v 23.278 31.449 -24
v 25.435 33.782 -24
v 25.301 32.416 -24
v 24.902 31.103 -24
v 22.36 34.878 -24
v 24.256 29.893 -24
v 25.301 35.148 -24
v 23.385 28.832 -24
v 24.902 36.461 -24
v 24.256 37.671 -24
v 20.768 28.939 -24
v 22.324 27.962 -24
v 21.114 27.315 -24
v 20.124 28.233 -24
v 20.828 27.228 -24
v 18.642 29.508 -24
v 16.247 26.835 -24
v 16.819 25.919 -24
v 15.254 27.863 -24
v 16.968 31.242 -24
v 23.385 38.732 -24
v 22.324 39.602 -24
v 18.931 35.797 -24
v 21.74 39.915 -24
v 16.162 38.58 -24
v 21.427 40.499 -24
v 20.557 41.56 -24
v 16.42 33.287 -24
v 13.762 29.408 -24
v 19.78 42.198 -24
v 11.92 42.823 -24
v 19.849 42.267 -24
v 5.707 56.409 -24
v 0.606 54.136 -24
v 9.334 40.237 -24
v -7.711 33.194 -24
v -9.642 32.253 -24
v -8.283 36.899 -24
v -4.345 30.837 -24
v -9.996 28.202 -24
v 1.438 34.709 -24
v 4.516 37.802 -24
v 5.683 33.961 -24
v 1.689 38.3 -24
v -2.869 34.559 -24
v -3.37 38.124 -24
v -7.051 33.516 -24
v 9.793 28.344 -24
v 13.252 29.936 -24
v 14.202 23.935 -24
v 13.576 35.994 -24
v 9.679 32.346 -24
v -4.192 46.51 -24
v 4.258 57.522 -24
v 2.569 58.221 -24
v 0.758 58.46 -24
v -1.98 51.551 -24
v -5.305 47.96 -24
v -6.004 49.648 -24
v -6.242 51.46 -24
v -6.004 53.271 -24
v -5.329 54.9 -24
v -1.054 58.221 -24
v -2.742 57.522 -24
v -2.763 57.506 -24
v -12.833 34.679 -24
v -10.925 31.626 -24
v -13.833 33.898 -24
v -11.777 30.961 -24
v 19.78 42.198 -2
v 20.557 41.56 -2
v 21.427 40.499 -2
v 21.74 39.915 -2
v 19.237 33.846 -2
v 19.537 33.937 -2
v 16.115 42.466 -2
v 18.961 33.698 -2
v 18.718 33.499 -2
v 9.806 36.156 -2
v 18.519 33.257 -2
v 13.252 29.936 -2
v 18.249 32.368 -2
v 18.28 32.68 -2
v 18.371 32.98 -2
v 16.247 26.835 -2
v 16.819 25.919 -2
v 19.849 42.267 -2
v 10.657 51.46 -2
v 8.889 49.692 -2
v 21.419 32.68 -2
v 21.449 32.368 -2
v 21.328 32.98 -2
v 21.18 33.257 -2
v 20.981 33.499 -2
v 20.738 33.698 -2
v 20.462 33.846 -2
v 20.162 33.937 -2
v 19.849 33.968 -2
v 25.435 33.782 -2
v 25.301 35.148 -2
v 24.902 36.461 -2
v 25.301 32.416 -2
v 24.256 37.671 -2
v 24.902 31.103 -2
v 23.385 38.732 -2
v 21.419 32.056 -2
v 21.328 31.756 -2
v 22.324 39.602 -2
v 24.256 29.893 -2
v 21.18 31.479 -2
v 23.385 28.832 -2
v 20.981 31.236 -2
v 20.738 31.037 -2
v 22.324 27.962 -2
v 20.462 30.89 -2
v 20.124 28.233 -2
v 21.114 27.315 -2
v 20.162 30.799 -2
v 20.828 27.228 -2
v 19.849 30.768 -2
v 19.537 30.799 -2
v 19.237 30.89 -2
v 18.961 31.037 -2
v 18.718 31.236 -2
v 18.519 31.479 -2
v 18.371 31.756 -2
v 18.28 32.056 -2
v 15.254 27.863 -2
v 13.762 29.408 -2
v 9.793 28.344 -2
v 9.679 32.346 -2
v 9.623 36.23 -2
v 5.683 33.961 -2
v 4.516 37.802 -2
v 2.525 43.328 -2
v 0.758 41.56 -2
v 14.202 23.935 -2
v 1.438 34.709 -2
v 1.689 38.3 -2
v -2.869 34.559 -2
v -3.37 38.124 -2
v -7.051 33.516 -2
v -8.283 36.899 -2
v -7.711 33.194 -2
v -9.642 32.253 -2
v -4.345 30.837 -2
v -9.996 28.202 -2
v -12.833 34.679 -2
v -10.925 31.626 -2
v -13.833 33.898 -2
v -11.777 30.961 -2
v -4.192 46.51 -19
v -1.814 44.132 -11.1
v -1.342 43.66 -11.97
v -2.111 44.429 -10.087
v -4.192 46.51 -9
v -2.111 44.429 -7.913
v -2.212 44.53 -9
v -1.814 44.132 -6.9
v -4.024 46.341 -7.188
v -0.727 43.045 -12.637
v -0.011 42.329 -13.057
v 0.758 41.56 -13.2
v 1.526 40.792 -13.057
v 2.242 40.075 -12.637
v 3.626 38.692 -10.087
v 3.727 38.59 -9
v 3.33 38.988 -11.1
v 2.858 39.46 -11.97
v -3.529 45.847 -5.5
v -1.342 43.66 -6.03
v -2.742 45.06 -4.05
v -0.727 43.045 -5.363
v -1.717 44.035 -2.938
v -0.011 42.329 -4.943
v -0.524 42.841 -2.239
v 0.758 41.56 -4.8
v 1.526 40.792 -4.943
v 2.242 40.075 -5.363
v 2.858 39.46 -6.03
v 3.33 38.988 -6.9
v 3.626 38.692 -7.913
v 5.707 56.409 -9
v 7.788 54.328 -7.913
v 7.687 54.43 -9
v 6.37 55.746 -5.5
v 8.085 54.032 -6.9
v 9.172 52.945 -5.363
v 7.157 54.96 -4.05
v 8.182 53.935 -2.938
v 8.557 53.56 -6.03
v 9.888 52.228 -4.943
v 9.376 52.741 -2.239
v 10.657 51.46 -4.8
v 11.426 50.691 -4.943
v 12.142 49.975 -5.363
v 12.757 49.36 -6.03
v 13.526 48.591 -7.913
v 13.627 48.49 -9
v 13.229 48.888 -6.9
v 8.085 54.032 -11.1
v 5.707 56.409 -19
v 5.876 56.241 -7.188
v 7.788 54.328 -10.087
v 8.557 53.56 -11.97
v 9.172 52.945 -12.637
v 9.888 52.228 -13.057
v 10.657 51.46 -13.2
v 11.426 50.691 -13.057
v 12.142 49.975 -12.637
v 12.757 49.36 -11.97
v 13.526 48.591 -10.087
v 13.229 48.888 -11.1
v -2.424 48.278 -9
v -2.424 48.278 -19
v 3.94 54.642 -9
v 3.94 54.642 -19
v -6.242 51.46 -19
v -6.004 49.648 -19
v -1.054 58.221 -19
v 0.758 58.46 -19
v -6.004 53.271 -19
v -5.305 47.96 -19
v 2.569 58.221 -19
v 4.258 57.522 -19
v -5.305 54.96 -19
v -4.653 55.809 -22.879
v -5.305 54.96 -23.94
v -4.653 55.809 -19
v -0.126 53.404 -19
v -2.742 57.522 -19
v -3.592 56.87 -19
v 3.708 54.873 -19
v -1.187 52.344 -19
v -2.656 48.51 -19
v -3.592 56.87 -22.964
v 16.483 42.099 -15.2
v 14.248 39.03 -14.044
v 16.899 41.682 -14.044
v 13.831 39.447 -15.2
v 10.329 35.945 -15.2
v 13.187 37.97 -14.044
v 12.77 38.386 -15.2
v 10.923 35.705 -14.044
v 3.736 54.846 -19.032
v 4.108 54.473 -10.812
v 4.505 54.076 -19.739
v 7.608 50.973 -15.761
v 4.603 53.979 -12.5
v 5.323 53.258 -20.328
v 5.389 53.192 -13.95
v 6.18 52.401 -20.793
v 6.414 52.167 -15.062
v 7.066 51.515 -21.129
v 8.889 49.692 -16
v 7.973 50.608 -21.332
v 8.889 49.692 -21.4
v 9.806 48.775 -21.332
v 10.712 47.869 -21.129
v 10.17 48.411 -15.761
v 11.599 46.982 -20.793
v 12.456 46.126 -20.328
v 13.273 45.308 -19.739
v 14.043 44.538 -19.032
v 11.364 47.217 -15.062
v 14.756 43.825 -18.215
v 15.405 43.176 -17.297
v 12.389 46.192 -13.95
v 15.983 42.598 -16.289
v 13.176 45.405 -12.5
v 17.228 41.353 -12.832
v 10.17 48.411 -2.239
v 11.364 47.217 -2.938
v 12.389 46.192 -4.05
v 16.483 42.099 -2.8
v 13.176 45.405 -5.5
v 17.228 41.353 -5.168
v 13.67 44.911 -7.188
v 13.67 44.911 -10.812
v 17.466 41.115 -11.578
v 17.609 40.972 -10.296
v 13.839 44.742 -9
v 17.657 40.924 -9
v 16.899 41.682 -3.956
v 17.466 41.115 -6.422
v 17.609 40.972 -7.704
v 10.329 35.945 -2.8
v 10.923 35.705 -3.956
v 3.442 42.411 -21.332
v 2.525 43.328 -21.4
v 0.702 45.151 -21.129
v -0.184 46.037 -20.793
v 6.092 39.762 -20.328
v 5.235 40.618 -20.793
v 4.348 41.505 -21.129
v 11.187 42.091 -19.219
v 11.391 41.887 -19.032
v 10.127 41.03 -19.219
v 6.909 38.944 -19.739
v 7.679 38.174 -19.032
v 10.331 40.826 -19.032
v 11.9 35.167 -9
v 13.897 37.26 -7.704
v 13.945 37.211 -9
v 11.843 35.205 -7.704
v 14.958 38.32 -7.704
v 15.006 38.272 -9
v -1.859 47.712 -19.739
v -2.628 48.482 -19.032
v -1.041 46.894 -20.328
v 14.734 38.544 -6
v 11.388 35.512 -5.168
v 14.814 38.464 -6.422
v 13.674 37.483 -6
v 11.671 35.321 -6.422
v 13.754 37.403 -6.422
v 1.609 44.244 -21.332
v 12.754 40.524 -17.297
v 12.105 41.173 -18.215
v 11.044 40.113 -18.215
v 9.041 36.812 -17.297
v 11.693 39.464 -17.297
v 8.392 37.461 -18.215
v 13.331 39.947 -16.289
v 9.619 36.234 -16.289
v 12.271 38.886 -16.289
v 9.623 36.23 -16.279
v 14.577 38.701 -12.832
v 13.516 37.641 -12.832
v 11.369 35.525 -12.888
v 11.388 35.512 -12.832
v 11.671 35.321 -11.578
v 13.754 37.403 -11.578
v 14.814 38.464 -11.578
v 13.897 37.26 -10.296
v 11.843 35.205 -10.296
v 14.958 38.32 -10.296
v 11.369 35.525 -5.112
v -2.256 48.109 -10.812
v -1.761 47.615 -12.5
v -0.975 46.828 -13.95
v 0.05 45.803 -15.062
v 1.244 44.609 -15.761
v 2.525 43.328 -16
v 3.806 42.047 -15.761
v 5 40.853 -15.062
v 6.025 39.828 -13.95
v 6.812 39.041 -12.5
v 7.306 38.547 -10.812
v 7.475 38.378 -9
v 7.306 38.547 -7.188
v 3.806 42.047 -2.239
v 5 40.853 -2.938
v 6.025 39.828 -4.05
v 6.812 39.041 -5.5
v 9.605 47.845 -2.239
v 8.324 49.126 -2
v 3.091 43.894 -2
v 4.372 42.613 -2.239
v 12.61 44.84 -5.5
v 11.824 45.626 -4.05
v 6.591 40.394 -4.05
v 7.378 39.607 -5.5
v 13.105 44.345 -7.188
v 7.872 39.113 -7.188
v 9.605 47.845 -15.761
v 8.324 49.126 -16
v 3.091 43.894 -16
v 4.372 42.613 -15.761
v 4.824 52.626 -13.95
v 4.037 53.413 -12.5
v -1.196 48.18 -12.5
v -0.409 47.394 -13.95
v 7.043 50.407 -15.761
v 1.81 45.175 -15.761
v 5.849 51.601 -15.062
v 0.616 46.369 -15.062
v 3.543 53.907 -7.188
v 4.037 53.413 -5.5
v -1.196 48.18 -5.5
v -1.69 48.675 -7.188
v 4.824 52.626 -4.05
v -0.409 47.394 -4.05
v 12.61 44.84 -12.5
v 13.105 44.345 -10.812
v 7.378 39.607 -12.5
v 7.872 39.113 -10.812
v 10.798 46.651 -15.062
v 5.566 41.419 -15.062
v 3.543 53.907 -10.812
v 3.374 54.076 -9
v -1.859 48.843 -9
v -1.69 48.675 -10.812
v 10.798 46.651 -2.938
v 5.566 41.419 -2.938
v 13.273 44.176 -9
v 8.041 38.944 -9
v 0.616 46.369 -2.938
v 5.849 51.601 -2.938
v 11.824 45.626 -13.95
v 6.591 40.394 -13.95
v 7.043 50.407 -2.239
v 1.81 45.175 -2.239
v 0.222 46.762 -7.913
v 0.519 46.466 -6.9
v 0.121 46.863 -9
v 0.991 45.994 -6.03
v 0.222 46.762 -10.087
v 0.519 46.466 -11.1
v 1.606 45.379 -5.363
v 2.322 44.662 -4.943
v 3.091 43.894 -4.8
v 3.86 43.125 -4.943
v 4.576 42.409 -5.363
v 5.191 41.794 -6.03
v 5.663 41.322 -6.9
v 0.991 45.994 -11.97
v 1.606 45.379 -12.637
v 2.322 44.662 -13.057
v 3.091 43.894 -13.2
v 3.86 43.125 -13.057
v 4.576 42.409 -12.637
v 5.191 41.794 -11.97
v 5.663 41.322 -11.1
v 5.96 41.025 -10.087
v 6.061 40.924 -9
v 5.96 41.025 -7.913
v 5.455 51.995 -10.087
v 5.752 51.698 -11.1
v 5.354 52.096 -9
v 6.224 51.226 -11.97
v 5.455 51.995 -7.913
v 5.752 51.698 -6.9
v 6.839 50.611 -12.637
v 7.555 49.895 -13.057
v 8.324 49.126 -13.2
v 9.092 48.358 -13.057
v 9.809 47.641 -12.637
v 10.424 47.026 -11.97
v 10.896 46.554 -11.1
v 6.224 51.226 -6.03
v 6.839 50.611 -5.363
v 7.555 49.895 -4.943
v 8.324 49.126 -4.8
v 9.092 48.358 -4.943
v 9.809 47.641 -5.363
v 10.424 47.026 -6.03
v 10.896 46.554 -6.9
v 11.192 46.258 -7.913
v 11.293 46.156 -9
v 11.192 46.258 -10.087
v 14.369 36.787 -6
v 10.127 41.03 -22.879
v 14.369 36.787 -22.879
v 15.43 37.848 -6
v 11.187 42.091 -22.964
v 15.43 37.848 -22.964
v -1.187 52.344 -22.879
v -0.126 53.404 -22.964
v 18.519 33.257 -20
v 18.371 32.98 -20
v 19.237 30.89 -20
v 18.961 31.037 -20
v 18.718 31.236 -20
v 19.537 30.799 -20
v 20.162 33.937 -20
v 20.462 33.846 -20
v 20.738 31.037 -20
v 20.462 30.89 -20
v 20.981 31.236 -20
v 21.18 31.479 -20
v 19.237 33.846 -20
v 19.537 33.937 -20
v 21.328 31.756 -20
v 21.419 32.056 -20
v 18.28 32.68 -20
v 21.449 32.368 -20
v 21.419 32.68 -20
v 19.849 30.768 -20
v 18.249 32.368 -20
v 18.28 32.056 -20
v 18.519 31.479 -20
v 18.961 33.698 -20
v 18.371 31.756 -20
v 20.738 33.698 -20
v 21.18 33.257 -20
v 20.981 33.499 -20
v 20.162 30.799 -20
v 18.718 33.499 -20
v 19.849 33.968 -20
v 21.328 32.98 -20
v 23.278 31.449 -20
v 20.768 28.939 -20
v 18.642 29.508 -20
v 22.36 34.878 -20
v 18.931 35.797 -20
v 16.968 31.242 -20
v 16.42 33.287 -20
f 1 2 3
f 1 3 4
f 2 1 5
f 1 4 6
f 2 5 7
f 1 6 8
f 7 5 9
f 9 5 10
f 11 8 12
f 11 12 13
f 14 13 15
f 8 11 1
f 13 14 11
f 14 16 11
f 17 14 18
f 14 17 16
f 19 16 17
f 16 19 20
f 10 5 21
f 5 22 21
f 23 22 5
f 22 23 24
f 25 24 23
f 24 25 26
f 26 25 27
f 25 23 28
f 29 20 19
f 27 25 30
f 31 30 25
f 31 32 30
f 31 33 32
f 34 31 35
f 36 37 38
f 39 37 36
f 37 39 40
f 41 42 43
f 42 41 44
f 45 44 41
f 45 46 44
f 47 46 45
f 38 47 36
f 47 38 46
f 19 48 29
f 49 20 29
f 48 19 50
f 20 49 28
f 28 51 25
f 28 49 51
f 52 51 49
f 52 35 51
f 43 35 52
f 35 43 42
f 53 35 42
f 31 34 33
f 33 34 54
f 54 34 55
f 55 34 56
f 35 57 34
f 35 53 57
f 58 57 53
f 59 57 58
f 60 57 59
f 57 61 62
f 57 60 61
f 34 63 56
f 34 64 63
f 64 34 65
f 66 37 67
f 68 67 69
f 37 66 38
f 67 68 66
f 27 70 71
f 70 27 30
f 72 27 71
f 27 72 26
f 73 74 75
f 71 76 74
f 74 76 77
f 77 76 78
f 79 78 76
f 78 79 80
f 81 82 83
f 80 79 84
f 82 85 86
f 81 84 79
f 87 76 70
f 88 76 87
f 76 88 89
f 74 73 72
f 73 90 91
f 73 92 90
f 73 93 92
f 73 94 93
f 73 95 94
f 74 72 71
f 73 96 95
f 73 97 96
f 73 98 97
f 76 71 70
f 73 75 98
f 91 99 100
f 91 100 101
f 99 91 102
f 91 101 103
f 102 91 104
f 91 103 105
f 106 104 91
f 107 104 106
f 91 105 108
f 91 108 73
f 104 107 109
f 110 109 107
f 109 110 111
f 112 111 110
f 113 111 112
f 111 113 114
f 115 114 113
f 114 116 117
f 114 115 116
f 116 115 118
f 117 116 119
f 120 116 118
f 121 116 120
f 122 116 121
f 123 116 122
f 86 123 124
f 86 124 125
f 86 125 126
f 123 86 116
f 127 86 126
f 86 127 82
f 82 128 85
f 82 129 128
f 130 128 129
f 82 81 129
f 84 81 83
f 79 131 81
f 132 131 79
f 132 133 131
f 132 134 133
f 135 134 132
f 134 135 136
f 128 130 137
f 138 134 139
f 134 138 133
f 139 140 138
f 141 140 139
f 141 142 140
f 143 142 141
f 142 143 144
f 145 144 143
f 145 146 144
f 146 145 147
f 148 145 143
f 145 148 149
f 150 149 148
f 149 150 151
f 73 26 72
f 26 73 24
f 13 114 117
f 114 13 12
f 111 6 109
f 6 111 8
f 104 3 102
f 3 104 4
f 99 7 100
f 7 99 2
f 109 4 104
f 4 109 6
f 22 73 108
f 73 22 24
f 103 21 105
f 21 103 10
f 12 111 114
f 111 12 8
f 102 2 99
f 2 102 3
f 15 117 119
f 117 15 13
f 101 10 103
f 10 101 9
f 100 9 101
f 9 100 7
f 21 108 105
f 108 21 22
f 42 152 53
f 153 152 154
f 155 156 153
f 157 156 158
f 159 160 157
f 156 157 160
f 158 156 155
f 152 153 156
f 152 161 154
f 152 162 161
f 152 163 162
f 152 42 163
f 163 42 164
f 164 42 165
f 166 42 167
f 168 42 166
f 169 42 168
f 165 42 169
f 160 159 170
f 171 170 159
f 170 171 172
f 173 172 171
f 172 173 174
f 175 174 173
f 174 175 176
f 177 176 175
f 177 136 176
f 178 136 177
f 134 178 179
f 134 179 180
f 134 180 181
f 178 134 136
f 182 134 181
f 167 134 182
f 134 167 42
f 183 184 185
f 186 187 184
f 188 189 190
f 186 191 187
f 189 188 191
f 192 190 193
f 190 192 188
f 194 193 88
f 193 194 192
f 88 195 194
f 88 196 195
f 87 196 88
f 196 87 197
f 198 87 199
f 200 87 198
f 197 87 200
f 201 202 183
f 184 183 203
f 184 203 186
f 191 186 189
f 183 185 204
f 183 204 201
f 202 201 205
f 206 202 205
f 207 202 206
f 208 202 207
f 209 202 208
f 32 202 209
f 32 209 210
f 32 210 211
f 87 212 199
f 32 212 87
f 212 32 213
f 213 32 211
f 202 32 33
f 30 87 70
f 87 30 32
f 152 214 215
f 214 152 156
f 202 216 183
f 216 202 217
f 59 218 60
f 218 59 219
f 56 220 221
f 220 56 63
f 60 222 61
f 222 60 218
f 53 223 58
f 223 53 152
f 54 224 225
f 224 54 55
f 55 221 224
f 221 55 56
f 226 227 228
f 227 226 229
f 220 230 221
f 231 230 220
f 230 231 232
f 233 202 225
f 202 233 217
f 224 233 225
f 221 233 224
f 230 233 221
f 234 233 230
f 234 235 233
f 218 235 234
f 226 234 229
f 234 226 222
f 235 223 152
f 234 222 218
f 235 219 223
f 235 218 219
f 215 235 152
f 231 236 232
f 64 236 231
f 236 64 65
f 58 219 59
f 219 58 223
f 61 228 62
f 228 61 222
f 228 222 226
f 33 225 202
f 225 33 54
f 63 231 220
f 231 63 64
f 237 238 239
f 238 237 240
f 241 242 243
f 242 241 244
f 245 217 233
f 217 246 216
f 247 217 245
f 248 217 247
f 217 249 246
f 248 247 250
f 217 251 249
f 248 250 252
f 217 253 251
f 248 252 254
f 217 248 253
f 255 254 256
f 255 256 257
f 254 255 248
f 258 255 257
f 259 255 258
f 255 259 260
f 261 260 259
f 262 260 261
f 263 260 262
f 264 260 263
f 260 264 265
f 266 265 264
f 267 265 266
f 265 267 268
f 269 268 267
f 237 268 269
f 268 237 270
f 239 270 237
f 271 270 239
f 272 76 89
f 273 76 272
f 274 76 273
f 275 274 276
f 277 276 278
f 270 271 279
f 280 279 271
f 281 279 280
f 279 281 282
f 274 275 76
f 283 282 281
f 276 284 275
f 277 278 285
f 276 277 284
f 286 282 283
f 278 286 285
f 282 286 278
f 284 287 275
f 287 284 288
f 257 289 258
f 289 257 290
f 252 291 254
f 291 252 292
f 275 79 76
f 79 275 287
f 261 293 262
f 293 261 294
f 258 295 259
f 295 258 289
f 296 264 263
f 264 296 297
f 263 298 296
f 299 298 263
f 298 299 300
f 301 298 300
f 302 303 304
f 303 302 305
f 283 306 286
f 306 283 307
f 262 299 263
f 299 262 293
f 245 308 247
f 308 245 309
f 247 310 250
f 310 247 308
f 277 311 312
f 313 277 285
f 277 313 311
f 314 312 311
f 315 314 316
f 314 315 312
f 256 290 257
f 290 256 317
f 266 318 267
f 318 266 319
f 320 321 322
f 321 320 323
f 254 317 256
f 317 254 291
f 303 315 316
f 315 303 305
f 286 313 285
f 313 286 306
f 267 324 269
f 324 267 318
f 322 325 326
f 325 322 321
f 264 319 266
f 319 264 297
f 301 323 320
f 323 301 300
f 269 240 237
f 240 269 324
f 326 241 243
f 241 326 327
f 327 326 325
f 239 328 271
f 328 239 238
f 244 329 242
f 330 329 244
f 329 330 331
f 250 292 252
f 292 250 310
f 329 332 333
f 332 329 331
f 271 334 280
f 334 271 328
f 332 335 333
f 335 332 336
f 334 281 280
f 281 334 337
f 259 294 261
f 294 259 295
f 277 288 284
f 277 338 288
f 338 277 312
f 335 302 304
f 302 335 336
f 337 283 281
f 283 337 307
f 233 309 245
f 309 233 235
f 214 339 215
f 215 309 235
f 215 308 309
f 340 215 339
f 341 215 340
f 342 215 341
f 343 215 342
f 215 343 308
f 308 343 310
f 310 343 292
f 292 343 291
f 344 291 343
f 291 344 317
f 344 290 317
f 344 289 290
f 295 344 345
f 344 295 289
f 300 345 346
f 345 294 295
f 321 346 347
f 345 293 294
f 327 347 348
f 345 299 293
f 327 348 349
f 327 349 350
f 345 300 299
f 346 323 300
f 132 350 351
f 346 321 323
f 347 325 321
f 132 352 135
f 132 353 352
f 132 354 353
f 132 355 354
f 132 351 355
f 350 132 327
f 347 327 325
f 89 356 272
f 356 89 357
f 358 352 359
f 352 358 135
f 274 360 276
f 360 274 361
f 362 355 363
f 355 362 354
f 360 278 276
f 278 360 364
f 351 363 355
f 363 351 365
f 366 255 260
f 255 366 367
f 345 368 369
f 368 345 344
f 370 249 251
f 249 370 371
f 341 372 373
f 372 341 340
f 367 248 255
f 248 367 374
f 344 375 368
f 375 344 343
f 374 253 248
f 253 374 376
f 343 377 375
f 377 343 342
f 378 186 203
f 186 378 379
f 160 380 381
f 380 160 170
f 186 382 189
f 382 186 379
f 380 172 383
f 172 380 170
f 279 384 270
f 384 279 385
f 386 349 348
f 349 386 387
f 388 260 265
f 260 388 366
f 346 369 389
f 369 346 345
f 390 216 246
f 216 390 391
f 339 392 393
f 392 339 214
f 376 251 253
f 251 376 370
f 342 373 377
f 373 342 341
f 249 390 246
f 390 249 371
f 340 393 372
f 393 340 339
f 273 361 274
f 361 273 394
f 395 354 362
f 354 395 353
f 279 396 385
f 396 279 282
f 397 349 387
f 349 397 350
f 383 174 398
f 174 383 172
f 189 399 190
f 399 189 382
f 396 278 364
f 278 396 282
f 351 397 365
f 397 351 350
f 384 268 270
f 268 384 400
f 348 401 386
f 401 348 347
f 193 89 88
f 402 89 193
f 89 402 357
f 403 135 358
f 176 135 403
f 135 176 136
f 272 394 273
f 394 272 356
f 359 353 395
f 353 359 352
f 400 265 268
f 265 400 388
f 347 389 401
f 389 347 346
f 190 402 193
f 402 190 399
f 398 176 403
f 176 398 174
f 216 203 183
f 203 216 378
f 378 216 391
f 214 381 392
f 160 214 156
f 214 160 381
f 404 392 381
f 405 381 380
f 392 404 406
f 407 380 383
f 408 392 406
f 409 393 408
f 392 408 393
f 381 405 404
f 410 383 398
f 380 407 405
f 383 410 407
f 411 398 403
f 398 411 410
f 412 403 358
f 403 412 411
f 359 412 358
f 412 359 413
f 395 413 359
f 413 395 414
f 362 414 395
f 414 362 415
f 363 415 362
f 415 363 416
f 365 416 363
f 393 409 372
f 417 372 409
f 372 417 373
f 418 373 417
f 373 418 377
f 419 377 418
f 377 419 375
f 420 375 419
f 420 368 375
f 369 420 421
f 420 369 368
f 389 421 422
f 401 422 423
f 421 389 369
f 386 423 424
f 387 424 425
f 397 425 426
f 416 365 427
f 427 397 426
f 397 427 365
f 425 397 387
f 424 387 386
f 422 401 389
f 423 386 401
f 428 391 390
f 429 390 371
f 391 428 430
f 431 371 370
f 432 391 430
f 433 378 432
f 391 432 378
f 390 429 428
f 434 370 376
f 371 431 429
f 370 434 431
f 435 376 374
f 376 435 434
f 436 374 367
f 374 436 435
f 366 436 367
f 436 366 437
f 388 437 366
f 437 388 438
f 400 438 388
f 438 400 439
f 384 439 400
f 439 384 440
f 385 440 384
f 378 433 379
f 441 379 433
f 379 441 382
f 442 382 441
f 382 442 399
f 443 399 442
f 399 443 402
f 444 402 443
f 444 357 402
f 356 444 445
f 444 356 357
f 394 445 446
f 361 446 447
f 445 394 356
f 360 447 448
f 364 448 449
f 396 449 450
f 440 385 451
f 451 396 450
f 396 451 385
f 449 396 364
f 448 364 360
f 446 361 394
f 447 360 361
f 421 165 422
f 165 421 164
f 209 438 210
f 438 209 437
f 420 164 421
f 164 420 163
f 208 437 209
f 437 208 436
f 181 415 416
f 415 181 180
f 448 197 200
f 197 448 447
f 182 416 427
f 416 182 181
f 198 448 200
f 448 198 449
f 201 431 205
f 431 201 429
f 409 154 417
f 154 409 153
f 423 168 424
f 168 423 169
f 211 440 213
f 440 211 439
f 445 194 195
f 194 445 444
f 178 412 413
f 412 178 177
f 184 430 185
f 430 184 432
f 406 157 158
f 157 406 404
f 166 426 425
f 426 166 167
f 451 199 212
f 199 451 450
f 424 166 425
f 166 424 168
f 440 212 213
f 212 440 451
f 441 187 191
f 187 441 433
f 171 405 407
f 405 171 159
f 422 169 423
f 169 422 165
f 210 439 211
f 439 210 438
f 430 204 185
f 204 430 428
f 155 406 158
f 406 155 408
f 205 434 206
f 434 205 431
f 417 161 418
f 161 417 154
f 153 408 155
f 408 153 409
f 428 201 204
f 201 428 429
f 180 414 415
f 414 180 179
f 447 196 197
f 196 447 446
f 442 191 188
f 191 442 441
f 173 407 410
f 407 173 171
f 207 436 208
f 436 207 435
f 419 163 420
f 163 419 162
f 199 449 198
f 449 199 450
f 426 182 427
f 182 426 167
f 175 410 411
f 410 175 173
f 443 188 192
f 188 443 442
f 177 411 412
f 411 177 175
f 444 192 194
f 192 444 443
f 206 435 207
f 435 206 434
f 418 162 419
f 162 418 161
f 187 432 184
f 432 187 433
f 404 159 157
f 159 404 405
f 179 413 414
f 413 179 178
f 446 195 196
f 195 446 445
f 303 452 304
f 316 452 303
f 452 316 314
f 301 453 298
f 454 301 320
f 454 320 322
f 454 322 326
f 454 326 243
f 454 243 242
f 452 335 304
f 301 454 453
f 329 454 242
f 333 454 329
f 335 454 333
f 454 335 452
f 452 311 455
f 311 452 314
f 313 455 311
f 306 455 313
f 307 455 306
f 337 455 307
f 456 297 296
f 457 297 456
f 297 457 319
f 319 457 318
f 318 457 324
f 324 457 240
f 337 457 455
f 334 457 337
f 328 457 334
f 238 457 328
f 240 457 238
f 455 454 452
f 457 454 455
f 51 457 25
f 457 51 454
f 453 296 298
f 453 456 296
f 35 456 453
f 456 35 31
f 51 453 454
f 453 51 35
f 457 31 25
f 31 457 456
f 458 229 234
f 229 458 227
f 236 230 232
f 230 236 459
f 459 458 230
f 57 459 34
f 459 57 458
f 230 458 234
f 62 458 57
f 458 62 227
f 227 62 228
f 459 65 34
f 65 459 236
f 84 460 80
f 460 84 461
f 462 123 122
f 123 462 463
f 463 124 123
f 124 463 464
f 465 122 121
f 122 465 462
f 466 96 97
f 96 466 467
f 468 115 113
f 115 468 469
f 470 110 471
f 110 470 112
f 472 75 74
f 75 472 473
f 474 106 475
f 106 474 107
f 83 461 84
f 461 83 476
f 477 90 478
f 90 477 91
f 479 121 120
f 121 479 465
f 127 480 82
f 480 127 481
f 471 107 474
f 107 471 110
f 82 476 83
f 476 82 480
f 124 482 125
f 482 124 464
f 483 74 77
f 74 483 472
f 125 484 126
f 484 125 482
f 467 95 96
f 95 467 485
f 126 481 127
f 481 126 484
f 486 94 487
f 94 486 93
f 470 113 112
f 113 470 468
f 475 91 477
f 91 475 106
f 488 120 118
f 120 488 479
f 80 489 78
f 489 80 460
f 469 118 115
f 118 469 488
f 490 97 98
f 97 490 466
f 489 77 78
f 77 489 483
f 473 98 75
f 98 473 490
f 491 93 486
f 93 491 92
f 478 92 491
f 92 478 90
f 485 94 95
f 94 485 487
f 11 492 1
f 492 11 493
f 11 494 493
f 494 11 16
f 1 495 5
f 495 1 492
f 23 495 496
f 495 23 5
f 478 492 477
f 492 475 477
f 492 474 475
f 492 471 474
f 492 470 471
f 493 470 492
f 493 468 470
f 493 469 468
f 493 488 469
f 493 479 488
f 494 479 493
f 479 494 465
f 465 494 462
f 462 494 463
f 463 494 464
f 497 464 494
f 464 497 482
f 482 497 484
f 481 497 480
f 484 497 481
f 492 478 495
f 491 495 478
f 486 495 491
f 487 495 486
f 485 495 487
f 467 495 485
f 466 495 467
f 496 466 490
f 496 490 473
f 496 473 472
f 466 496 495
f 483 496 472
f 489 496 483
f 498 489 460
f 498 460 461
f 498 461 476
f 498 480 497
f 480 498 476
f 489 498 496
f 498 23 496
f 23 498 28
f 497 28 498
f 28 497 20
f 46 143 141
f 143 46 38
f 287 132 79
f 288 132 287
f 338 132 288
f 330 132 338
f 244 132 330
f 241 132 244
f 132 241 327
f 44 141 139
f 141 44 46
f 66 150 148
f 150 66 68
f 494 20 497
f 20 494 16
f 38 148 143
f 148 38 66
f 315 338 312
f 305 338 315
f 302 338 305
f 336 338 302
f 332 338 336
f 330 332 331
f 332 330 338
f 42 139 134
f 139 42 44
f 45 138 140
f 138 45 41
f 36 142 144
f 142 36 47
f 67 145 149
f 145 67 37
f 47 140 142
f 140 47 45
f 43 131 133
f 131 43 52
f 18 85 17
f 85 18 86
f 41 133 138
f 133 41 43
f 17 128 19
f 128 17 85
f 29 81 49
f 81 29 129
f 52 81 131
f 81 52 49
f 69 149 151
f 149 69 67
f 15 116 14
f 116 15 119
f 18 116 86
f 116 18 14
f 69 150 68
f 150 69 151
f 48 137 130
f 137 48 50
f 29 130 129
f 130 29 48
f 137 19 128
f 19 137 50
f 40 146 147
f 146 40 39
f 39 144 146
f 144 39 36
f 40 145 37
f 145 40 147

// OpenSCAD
// file: tensioner_608.scad
include <configuration.scad>;

offset_x = 18;
//offset_y = 12;
//rotate_z = -22.5;

module tensioner_608() {

  difference() {
    union() {
      difference() {
        union() {
	            translate([0, offset_x-4, -4]) cylinder(r=7, h=22, center=true, $fn=32);
   	          translate([0, offset_x, -4]) cylinder(r=7, h=22, center=true, $fn=32);
	        translate([0, 3, -4])
            cube([14, 20, 22], center=true);
          translate([0, -7, -12.5])
            cylinder(r=7, h=5, center=true, $fn=24);
        }
        translate([0, -11, 11])
          cube([18, 22, 22], center=true);
        rotate([0, 90, 0])
          cylinder(r=12+clear, h=9, center=true, $fn=60);
      }
      rotate([0, 90, 0]) 
        cylinder(r=7, h=14, center=true, $fn=24);
    }
    rotate([0, 90, 0]) {
      cylinder(r=11, h=7+clear, center=true);
   #   cylinder(r=(8+clear)/2, h=18, center=true, $fn=24);
    }
    
//fillament holes
    for (y = [10, -12]) {
      translate([0, y, -7])
        cube([3/2, 6, 20], center=true);
      translate([0.75, y, -16])
        rotate([0, 45, 0]) cube([5, 6, 3], center=true);
    }
   
    #  translate([-0, offset_x+2, -2])        
        cylinder(r=m3_open_radius , h=50, center=true, $fn=32);
      translate([-0, offset_x+2, -16])
        cylinder(r=m3_nut_radius+clear, h=5, center=false, $fn=6); 
        
     
    //}      
  }
}


  tensioner_608();
// file: corner.scad
include <configuration.scad>;
use<libraries/frame_axis_block.scad>;

//extr=15;
//frame_thickness=6;
//bracket = 5;
//frame_type=0; //type 0 solid or 1 for sepparate parts

module corner(extr,h,frame_thickness,frame_type) {
radius = thickness+cos(30)*diagonal/2+frame_thickness;  
  union(){
  difference() {
      intersection () {
        translate([0, extr/4, (h-extr)/2]) rotate([90,0,0])
          cube([diagonal+extr*1.8,h,diagonal+extr*1.8], center=true);
        translate([0, 0, (h-extr)/2])
          cylinder(h=h, r=radius, center=true, $fn=32);
      }
    
  // Remove 2/3 of cylinder.
    for (i=[-1,1])
    rotate([0,0,30*i])
    translate([0, radius, 0])
      cube([2*radius, 2*radius, 2*h], center=true);
  // Center round.
    
    rotate([0, 0, 45])
      cylinder(r=diagonal/2+0.5, h=2*h, center=true);
  // Horizontal OpenBeam frame pieces.
  for(i=[-1,1]) {
    rotate([0, 0, -30*i]) 
      translate([(radius-frame_thickness/2)*i, 40, (h-extr)/2])
        cube([frame_thickness+0.1, 60, h+1], center=true);
    
  // Frame brackets under the corner.
 
  translate([diagonal/2*i, 0, (h-extr)/2])
   rotate([0, 0, -30*i]) 
    scale([i,1,1]) frame_axis_block(h+1,diagonal*2,thickness,extr,diagonal,frame_type,diagonal,diagonal,0,layer_h);
  
    }


    if (frame_type==1) {
      if (h<(extr*1.5)){
       for (a = [-45, 45]) {
         rotate([0, 0, a]) rotate([90, 0, 0]) {
           cylinder(r=m3_radius , h=4*extr, center=true, $fn=12);
         translate([0, 0, radius])
           cylinder(r=m3_nut_radius, h=extr/2, center=true, $fn=24);
         }
       }
      } 
      else {
        for (a = [-45, 45]) {
          for (b =[-1,1]) {
            rotate([0, 0, a])
              rotate([90, 0, 0])
                translate([0, (h-extr)/2+(h-extr)/2*b, 0])
                  {
                  cylinder(r=m3_radius, h=4*extr, center=true, $fn=12);
                  translate([0, 0, radius])
                    cylinder(r=m3_nut_radius, h=extr/2, center=true, $fn=24);
                  }
          }
        }
      }
    
    }
  }
//square addon to corner circle    
for  (i=[-1,1]) {
      scale([i,1,1])
      rotate([180, 0, -30]) 
        translate([(radius-frame_thickness), 1, -(h-extr/2)])
         scale([1,-1,1])
          cube([frame_thickness, extr/2, h], center=false);
      }
  }

}

translate([0, 0, extr/2]) {
  corner(extr,extr*1.4,frame_thickness,frame_type);
% rotate([0, 0, 45]) cube([extr, extr, 10*extr], center=true);  
}
// file: libraries/frame_axis_block.scad
 extr=20; h = 3*extr; w = h; diagonal = extr*sqrt(2); thickness=3.6; 
 rear_hole_dist=extr/2; screw_hole=3.2; forward_hole_dist=5; frame_type=0; layer_h=0.4;
 

module frame_axis_block(h, w, thickness, extr, diagonal, frame_type, forward_hole_dist, rear_hole_dist,screw_hole,layer_h) 
{
  difference() {
    union(){
      intersection() {
        //rotate([0, 0, -30])
         translate([-extr*sin(15), -extr*cos(15), -h/2], center=false)
	          cube([extr*sin(15)+thickness, w, h]);
        union() {
	        translate([0,-extr*cos(15), -h/2]) 
        //   rotate([0, 0, -30])
	            cube([thickness, w, h]); //main frame plate
  	    //  rotate([0, 0, -45])
          translate([-extr*sin(15), -extr*cos(15), -h/2])
            rotate([0,0,-15])
	            cube([extr, extr, h], center=false); //15degr extr cutout
        }
      }

      //mickey mouse ears
            translate([thickness/2, w-extr*cos(15), -(h)/2+layer_h])
              cylinder (r=10, h=layer_h*2,center=true, $fn=26);
    } 
    
    if (frame_type ==1) {
      // Vertical OpenBeam mounting screw holes.
        for (z=[-1, 1]) 
          translate([0, 0, (h-extr)/2*z]) 
            rotate([90, 0, 75])
              translate([-extr/2, 0, extr/2*sin(15)+5]) 
                 cylinder(r=screw_hole/2, h=50, $fn=12, center=true);

      }


    // Horizontal OpenBeam mounting screw holes.
       for (z= [h/2-extr/2, -h/2+extr/2])
       for (y = [forward_hole_dist, w-extr*cos(15)-rear_hole_dist]) 
           translate([0, y, z])
             rotate([0, 90, 0])
               cylinder(r=screw_hole/2, h=10, $fn=12, center=true);
}
}
//
 scale([1, 1, 1]) rotate([0, 90, 90]) rotate([0, 0, 30]) 
{ frame_axis_block(h, w, thickness, extr, diagonal, frame_type, forward_hole_dist, rear_hole_dist,screw_hole,layer_h);
    translate([-extr*sin(15), -extr*cos(15), -h]) rotate([0, 0, 75]) % cube([extr, extr, 1000], center=false);
   }
// file: configuration.scad
Magneto=1;

ball_D=25.4/2;


// OD = outside diameter, corner to corner.
m3_nut_od = 6.1;
m3_nut_radius = (m3_nut_od+0.2)/2;
m3_nut_h=3;

// Major diameter of metric 3mm thread.
m3_major = 2.85;
m3_radius = m3_major/2;
m3_open_radius = 3.2/2;
m3_cap=4;
m3_clr=0.2;

m_frame_major = 3.8;
m_frame_radius=m_frame_major/2;
m_frame_clr=0.3;
m_frame_open=m_frame_radius+m_frame_clr*2;
m_frame_cap=(7.2+m_frame_clr)/2;
m_frame_nut=(8+m_frame_clr)/2;

// NEMA17 stepper motors.
motor_d=48;
motor_shaft_diameter = 5;
motor_shaft_radius = (motor_shaft_diameter+0.3)/2;

//frame motor dimm
motor_screws = 31; // mm center-to-center
motor_width = 42.5; // mm total motor face width
motor_height = 15; // mm bracket height
motor_length = 12; // mm bracket length
motor_screws_height = (motor_width - motor_screws) / 2;
motor_shaft = 30; // mm from motor face to OpenBeam center
motor_thickness = 6; // mm bracket thickness
//height = 2*extr + motor_width;
//diagonal = extr*sqrt(2);
motor_offset = motor_shaft+2;

// Frame brackets.
thickness = 3.6;

// extrusion dimmensions
extr = 20; //15 - 20 for 20x20 extrusion
extr_tslot = 6.8; //3.2 6.8 for 20x20 extrusion
extr_nut = 11; //5.8 11 for 20x20 extrusion
extr_corn = (extr - extr_tslot)/2;
diagonal=extr*sqrt(2);

clear = 0.4;
// corner parametrs
frame_thickness=10; //thickness for frame sheets
bracket = 5;
frame_type=0; //type 0 solid. 10 for solid with mottors on the top or 1 for sepparate parts
radius = thickness+cos(30)*diagonal/2+frame_thickness;
slot_hole=3;

//roller parametrs
extr_clr=0.7; // extrusion clearence distance
cone_radius = 5;
cone_radius_dwn = 4;
shrink_wrap = 0.1; // mm thickness
h_base=7;
H_roller=diagonal/2+extr_clr*2+h_base;
W_roller=diagonal/2+extr_clr+m3_radius;
rod_offset=W_roller+5; //(25)
layer_h=0.4;

//effector
separation = H_roller*2;
R_od = 33; //effector offset
R_id=20;
height = 9;
cone_r1 = height/2;
cone_r2 = 5.5;
eff_offset=R_od;

//dimmensions calculations for frame_motor (some trigonometry)

f1= (extr*sin(15)+thickness)/cos(30);
f2=(extr*sin(15)+thickness)*cos(60)/sin(60);
L=f1+diagonal+motor_offset;
f4=L*sin(30)/cos(30)-motor_d/2;
f3=f4/2;
w_fm = L/cos(30)-f3-f2;

//motor cut_off frame
h_mot_cut_off = L*sin(30) - (motor_screws - motor_d/2)*cos(30);
// main file
include <configuration.scad>;
use <libraries/frame_axis_block.scad>;
use <corner.scad>;
use <tensioner_608.scad>;


//extr=25;
h_up_frame  = motor_d;
w_up_frame = w_fm+10;
diagonal = extr*sqrt(2);
estp_sw=1; //put 1 to enable enstop holes
double_frame=1; //put 1 to enable dual_frame option

estp_out = 15; //distance between lower frame and endstop hole(works only if dual_frame on)
h_tensioner=22;

frame_cheek_output=13;

//frame cheek output:
//1 - for sqear tube version assembled
// - for  sqear tube:
//11 - printing plate
//12 - corner only
//13 - tensioner only
//2 - for separate right cheek
//3 - for separate left cheek
//4 - assembled version.


module frame_cheek(double_frame,estp_sw)
 for (i=[-1,1])
  difference ()  {
    union () {
      frame_axis_block(h_up_frame, w_up_frame, thickness, extr, diagonal, frame_type, extr*0.9, extr/2,m_frame_open*2,layer_h);
        if (frame_type==1){
          if (double_frame==1) { //small addon to parts width in oder to fit endstop under lower frame if "dual frame" is on
            if (estp_sw==1) {
              intersection() {
                translate([-extr*sin(15), -extr*cos(15), h_up_frame /2], center=false)
                  cube([extr*sin(15)+thickness, extr*cos(15)+estp_out, estp_out]);
                difference() {
                  union (){
                    translate([-extr*sin(15), -extr*cos(15), h_up_frame /2])
                      rotate([0,0,-15])
                        cube([extr, extr*cos(15)+20 , estp_out], center=false); //15degr extr cutout
                    translate([0, -extr*cos(15), h_up_frame /2], center=false)
                      cube([thickness, extr*cos(15)+estp_out , estp_out]);
                  }
                  translate([-thickness/2, estp_out, h_up_frame /2+estp_out]) rotate([0, 90, 0]) 
                    cylinder(r=estp_out, h=thickness*2, center=false, $fn=60);
                }
              }
            }
          }
      }
    }
     if(frame_type==1){
       if (double_frame==1) { 
         if ( estp_sw == 1) {
           //// HoneyWell ZM micro switch holes
           translate([-5, -extr*cos(15)/2+9.5/2, h_up_frame /2-extr/4+estp_out]) rotate([0, 90, 0]) 
             cylinder(r=1.3, h=50, center=false, $fn=60);
           translate([-5, -extr*cos(15)/2-9.5/2, h_up_frame /2-extr/4+estp_out]) rotate([0, 90, 0]) 
             cylinder(r=1.3, h=50, center=false, $fn=60);}
       }
        else {
           if (estp_sw==1) {
           //// HoneyWell ZM micro switch.
           translate([-5, -extr*cos(15)/2+9.5/2, h_up_frame/2-extr/4]) rotate([0, 90, 0]) 
             cylinder(r=1.3, h=50, center=false, $fn=60);
           translate([-5, -extr*cos(15)/2-9.5/2, h_up_frame /2-extr/4]) rotate([0, 90, 0]) 
             cylinder(r=1.3, h=50, center=false, $fn=60);
           }  
         }         
     }
     else {
      if (estp_sw==1) {
        //// HoneyWell ZM micro switch.
        translate([-5, -extr*cos(15)/2+9.5/2, h_up_frame /2-(m3_open_radius+2)]) rotate([0, 90, 0]) 
          cylinder(r=1.3, h=50, center=false, $fn=60);
        translate([-5, -extr*cos(15)/2-9.5/2, h_up_frame /2-(m3_open_radius+2)]) rotate([0, 90, 0]) 
          cylinder(r=1.3, h=50, center=false, $fn=60);
          }  
         }

       //hole cuttoff
    rotate([0, 90, 0]) 
    if (double_frame==1) {
      if (h_up_frame  > (w_up_frame-extr*cos(15))  ) {
        translate([0, (w_up_frame  -extr*cos(15))/2, -thickness])
          cylinder(r=(h_up_frame -extr*2)/2, h=extr, center=true, $fn=60);}
      else {
        translate([0, (w_up_frame-extr*cos(15))/2+extr/8, -thickness])
          cylinder(r=(h_up_frame -extr)/2, h=extr, center=true, $fn=60);}
    }
    else {
      if (h_up_frame  > (w_up_frame-extr*cos(15))  )  {
          translate([h_up_frame /2-w_up_frame  , w_up_frame  -extr*cos(15), -thickness])
            cylinder(r=w_up_frame  -extr, h=extr, center=true, $fn=60);
          translate([h_up_frame /2-w_up_frame  , w_up_frame  , -extr/2]) rotate (180,0,0)
            cube([h_up_frame ,w_up_frame  ,extr]);
          }
        else {
           translate([-h_up_frame /2, h_up_frame -extr*cos(15), -thickness])
             cylinder(r=h_up_frame -extr, h=extr, center=true, $fn=60);
           translate([-h_up_frame /2, h_up_frame -extr , -thickness])  rotate (0,0,0)
             cube([h_up_frame -extr*cos(15),w_up_frame  ,extr]);
        }
       
    }
 }




//translate([-extr*sin(15),-extr*cos(15), -150])
    // extrusion.
  //% rotate([0, 0, 75]) cube([extr, extr, 300], center=false);

////////////////////////////////////////////////////////////////////
////////////////////////////////////////////////////////////////////
////////////////////////////////////////////////////////////////////

module frame_cheek_tube ()
for (i=[-1,1])
difference() {
  union() {
           
            translate([diagonal/2*i,0,0])
              rotate ([0,0,-30*i])
                scale ([i,1,1])
                  frame_cheek(1,i);  
    
    intersection()
     {
        rotate([0,0,127])
          translate([W_roller+thickness+9,0,-(h_up_frame-thickness*2)/2])
            {rotate([0,0,27+90*i])
             cube([14,W_roller*4,thickness*2],center=true);
             }
    /// remove ou
     rotate([0,0,30])
       translate([0,w_up_frame/2,0])
         cube([(radius-frame_thickness)*2,w_up_frame,h_up_frame+2],center=true);
      }
        
        
          translate ([0,0,(extr-h_up_frame)/2])
            corner(extr,h_up_frame ,frame_thickness,frame_type);
             
    //tube fix block
    rotate([0,0,45]) 
          //extrusion fix block
      intersection(){
        cylinder(r=W_roller+cone_radius_dwn,h=h_up_frame,center=true);
        rotate([0,0,-45])
          translate([0,cone_radius_dwn,0])
            cylinder(r=diagonal/2+cone_radius_dwn,h=h_up_frame+2,center=true, $fn=12);
      }

   //support frame 
     
              translate ([diagonal/2*i,extr*0.4,-h_up_frame /2])
                rotate([0,0,270])
                  cylinder(r=extr*0.4, h=h_up_frame , $fn=3);
  
}
//m3_screw hole
        rotate([0,0,123])
          translate([W_roller+thickness+7.5, 1, -(h_up_frame-thickness*2)/2])
            % cylinder(r=m3_open_radius+1/4,h=h_up_frame*2,center=true,$fn=16);


/// V-slots for tensioners
              for(i=[1,-1])
              { rotate ([0,0,145*i])
                  translate ([0,-(W_roller+cone_radius/2),0])
                    rotate([0,0,30])
                     cylinder(r=thickness+3*clear,h=h_up_frame*2, center=true, $fn=3);
              }
/// space for extrusion cutt off              
              rotate([0,0,45])
                cube ([extr+extr_clr,extr+extr_clr,h_up_frame*2 ], center=true);
  for(i=[-1,1]) {
  translate([-2/2,0,-h_up_frame])
   rotate(270,0,0)
    cube([diagonal*2,2,h_up_frame*2]);
  
    translate ([-diagonal/2*i,0,-h_up_frame])
      
        cylinder (r=2,h=h_up_frame*2, $fn=16);
    translate ([-diagonal/4*i,0,0])
      
        cube ([diagonal/2,4,h_up_frame+4], center=true);
   }
 
      //cutt_off holles for tube joint
      for(a=[-1,1]) {
      if (h_up_frame<(extr*1.5)){
        
                      
              translate([0,-(diagonal/2+m_frame_radius+m_frame_clr) , (h_up_frame-extr)/3-2])
                rotate([90, 0, 0])
                 {
                 cylinder(r=m_frame_radius, h=4*extr, center=true, $fn=12);
                 translate([0, 0, radius-frame_thickness])
                // union()
                // {
                  cylinder(r=m_frame_cap, h=extr*2/3, center=true, $fn=24);
                //  scale(-1,1,1)
                  //  translate ([-m_frame_cap,0,-extr/3])
                    //  cube ([m_frame_cap*2,m_frame_cap*8,extr*2/3]);
               //  }
                  
                translate([0, 0, -(radius-frame_thickness)])
               //  union(){
                  cylinder(r=m_frame_nut, h=extr*2/3, center=true, $fn=6);
                 // scale(-1,1,1)
                 //   translate ([-m_frame_cap,0,-extr/3])
                   //   cube ([m_frame_cap*2,m_frame_cap*8,extr*2/3]);
                 //}
                 }
               
          
      
      }
      else {
                 translate([0,-(diagonal/2+m_frame_radius) , (h_up_frame-extr)/3*(a)-2])
              rotate([0, 90, 0])
                {
                 cylinder(r=m_frame_radius, h=2*extr, center=true, $fn=12);
                 translate([0, 0, (5+extr/2)]) 
               //  union()
               //  {
                  cylinder(r=m_frame_cap, h=extr*2/3, center=true, $fn=24);
              //    scale(-1,1,1)
              //      translate ([-m_frame_cap,0,-extr/3])
                //      cube ([m_frame_cap*2,m_frame_cap*8,extr*2/3]);
                // }
                   
                 translate([0, 0, -(5+extr/2)]) 
            //     union(){
                  cylinder(r=m_frame_nut, h=extr*2/3, center=true, $fn=6);
              //    scale(-1,1,1)
                //    translate ([-m_frame_cap,0,-extr/3])
                  //    cube ([m_frame_cap*2,m_frame_cap*8,extr*2/3]);
               //  }

               }               
          }
     
      }
  for(a=[-1,1])
    translate ([(diagonal/2+thickness/2)*a,extr*0.4,-h_up_frame ])
      rotate([0,0,-90]) //rotate triangels around z-axis
        cylinder(r=extr*0.2, h=h_up_frame*2 , $fn=3);
  if (frame_type==0) {     
   rotate ([0,0,60]) 
          translate ([0,-(radius-frame_thickness/2+6/2),h_up_frame/2-15/2+clear])
          cube([22*2,6+frame_thickness,15],center=true);   
        //// HoneyWell ZM micro switch.
    rotate ([0,0,-30]) { 
        translate([-5, -2+9.5/2, h_up_frame/2-(m3_open_radius+2)])
      rotate([0,90,0])
            cylinder(r=1.3, h=50, center=false, $fn=60);
      translate([-5, -2-9.5/2, h_up_frame/2-(m3_open_radius+2)]) 
      rotate([0,90,0])
            cylinder(r=1.3, h=50, center=false, $fn=60);
          }
  }
  }
//////////////////////////////////////////////////////////////////////////
//////////////////////////////////////////////////////////////////////////
//////////////////////////////////////////////////////////////////////////
//tensioner block
module tensioner() {
 for (i=[-1,1]) {
  union(){
    difference(){
      union(){
        cylinder(r=W_roller+cone_radius_dwn+extr_clr/2+thickness,h=h_tensioner,center=true);
        translate([0,W_roller+thickness+13,-4]) 
          rotate([0,180,(90+35)]) 
            tensioner_608();
      }
      
      cylinder(r=W_roller+cone_radius_dwn+extr_clr/2+0*clear,h=h_tensioner+4,center=true);
      rotate([0,0,-45])
          translate ([0,-(W_roller+cone_radius_dwn+extr_clr+thickness),0])
            cube([(W_roller+cone_radius_dwn+extr_clr+thickness)*2,2*(W_roller+cone_radius_dwn+extr_clr+thickness),h_tensioner+4],center=true);
      rotate([0,0,45])
          translate ([0,-(W_roller+cone_radius_dwn+extr_clr+thickness),0])
            cube([(W_roller+cone_radius_dwn+extr_clr+thickness)*2,2*(W_roller+cone_radius_dwn+extr_clr+thickness),h_tensioner+4],center=true);
     
    }
    rotate([0,0,145*i])
      translate ([0,-(W_roller+cone_radius/2),0])
        rotate([0,0,30])
          cylinder(r=thickness,h=h_tensioner, center=true, $fn=3);      

    
  }
}
}





//insert module frame_cheek
if (frame_cheek_output==2) {
     scale(1,1,1)
    frame_cheek();
   }  
if (frame_cheek_output==3) {
  //estp_sw=1;
  rotate ([0,0,180])
    scale(-1,1,1) 
      frame_cheek();    
   } 
if (frame_cheek_output==1){
  frame_cheek_tube();
  translate([0,0,(22-4)/2])
  tensioner();
}
if (frame_cheek_output==11){
  frame_cheek_tube();
  translate([0,diagonal/2,-(h_up_frame-22)/2])
 rotate ([0,180,-10])
  tensioner();
}

if (frame_cheek_output==12){
  frame_cheek_tube();
}
if (frame_cheek_output==13){

  translate([0,diagonal/2,-(h_up_frame-22)/2])
 rotate ([0,180,-10])
  tensioner();
}
